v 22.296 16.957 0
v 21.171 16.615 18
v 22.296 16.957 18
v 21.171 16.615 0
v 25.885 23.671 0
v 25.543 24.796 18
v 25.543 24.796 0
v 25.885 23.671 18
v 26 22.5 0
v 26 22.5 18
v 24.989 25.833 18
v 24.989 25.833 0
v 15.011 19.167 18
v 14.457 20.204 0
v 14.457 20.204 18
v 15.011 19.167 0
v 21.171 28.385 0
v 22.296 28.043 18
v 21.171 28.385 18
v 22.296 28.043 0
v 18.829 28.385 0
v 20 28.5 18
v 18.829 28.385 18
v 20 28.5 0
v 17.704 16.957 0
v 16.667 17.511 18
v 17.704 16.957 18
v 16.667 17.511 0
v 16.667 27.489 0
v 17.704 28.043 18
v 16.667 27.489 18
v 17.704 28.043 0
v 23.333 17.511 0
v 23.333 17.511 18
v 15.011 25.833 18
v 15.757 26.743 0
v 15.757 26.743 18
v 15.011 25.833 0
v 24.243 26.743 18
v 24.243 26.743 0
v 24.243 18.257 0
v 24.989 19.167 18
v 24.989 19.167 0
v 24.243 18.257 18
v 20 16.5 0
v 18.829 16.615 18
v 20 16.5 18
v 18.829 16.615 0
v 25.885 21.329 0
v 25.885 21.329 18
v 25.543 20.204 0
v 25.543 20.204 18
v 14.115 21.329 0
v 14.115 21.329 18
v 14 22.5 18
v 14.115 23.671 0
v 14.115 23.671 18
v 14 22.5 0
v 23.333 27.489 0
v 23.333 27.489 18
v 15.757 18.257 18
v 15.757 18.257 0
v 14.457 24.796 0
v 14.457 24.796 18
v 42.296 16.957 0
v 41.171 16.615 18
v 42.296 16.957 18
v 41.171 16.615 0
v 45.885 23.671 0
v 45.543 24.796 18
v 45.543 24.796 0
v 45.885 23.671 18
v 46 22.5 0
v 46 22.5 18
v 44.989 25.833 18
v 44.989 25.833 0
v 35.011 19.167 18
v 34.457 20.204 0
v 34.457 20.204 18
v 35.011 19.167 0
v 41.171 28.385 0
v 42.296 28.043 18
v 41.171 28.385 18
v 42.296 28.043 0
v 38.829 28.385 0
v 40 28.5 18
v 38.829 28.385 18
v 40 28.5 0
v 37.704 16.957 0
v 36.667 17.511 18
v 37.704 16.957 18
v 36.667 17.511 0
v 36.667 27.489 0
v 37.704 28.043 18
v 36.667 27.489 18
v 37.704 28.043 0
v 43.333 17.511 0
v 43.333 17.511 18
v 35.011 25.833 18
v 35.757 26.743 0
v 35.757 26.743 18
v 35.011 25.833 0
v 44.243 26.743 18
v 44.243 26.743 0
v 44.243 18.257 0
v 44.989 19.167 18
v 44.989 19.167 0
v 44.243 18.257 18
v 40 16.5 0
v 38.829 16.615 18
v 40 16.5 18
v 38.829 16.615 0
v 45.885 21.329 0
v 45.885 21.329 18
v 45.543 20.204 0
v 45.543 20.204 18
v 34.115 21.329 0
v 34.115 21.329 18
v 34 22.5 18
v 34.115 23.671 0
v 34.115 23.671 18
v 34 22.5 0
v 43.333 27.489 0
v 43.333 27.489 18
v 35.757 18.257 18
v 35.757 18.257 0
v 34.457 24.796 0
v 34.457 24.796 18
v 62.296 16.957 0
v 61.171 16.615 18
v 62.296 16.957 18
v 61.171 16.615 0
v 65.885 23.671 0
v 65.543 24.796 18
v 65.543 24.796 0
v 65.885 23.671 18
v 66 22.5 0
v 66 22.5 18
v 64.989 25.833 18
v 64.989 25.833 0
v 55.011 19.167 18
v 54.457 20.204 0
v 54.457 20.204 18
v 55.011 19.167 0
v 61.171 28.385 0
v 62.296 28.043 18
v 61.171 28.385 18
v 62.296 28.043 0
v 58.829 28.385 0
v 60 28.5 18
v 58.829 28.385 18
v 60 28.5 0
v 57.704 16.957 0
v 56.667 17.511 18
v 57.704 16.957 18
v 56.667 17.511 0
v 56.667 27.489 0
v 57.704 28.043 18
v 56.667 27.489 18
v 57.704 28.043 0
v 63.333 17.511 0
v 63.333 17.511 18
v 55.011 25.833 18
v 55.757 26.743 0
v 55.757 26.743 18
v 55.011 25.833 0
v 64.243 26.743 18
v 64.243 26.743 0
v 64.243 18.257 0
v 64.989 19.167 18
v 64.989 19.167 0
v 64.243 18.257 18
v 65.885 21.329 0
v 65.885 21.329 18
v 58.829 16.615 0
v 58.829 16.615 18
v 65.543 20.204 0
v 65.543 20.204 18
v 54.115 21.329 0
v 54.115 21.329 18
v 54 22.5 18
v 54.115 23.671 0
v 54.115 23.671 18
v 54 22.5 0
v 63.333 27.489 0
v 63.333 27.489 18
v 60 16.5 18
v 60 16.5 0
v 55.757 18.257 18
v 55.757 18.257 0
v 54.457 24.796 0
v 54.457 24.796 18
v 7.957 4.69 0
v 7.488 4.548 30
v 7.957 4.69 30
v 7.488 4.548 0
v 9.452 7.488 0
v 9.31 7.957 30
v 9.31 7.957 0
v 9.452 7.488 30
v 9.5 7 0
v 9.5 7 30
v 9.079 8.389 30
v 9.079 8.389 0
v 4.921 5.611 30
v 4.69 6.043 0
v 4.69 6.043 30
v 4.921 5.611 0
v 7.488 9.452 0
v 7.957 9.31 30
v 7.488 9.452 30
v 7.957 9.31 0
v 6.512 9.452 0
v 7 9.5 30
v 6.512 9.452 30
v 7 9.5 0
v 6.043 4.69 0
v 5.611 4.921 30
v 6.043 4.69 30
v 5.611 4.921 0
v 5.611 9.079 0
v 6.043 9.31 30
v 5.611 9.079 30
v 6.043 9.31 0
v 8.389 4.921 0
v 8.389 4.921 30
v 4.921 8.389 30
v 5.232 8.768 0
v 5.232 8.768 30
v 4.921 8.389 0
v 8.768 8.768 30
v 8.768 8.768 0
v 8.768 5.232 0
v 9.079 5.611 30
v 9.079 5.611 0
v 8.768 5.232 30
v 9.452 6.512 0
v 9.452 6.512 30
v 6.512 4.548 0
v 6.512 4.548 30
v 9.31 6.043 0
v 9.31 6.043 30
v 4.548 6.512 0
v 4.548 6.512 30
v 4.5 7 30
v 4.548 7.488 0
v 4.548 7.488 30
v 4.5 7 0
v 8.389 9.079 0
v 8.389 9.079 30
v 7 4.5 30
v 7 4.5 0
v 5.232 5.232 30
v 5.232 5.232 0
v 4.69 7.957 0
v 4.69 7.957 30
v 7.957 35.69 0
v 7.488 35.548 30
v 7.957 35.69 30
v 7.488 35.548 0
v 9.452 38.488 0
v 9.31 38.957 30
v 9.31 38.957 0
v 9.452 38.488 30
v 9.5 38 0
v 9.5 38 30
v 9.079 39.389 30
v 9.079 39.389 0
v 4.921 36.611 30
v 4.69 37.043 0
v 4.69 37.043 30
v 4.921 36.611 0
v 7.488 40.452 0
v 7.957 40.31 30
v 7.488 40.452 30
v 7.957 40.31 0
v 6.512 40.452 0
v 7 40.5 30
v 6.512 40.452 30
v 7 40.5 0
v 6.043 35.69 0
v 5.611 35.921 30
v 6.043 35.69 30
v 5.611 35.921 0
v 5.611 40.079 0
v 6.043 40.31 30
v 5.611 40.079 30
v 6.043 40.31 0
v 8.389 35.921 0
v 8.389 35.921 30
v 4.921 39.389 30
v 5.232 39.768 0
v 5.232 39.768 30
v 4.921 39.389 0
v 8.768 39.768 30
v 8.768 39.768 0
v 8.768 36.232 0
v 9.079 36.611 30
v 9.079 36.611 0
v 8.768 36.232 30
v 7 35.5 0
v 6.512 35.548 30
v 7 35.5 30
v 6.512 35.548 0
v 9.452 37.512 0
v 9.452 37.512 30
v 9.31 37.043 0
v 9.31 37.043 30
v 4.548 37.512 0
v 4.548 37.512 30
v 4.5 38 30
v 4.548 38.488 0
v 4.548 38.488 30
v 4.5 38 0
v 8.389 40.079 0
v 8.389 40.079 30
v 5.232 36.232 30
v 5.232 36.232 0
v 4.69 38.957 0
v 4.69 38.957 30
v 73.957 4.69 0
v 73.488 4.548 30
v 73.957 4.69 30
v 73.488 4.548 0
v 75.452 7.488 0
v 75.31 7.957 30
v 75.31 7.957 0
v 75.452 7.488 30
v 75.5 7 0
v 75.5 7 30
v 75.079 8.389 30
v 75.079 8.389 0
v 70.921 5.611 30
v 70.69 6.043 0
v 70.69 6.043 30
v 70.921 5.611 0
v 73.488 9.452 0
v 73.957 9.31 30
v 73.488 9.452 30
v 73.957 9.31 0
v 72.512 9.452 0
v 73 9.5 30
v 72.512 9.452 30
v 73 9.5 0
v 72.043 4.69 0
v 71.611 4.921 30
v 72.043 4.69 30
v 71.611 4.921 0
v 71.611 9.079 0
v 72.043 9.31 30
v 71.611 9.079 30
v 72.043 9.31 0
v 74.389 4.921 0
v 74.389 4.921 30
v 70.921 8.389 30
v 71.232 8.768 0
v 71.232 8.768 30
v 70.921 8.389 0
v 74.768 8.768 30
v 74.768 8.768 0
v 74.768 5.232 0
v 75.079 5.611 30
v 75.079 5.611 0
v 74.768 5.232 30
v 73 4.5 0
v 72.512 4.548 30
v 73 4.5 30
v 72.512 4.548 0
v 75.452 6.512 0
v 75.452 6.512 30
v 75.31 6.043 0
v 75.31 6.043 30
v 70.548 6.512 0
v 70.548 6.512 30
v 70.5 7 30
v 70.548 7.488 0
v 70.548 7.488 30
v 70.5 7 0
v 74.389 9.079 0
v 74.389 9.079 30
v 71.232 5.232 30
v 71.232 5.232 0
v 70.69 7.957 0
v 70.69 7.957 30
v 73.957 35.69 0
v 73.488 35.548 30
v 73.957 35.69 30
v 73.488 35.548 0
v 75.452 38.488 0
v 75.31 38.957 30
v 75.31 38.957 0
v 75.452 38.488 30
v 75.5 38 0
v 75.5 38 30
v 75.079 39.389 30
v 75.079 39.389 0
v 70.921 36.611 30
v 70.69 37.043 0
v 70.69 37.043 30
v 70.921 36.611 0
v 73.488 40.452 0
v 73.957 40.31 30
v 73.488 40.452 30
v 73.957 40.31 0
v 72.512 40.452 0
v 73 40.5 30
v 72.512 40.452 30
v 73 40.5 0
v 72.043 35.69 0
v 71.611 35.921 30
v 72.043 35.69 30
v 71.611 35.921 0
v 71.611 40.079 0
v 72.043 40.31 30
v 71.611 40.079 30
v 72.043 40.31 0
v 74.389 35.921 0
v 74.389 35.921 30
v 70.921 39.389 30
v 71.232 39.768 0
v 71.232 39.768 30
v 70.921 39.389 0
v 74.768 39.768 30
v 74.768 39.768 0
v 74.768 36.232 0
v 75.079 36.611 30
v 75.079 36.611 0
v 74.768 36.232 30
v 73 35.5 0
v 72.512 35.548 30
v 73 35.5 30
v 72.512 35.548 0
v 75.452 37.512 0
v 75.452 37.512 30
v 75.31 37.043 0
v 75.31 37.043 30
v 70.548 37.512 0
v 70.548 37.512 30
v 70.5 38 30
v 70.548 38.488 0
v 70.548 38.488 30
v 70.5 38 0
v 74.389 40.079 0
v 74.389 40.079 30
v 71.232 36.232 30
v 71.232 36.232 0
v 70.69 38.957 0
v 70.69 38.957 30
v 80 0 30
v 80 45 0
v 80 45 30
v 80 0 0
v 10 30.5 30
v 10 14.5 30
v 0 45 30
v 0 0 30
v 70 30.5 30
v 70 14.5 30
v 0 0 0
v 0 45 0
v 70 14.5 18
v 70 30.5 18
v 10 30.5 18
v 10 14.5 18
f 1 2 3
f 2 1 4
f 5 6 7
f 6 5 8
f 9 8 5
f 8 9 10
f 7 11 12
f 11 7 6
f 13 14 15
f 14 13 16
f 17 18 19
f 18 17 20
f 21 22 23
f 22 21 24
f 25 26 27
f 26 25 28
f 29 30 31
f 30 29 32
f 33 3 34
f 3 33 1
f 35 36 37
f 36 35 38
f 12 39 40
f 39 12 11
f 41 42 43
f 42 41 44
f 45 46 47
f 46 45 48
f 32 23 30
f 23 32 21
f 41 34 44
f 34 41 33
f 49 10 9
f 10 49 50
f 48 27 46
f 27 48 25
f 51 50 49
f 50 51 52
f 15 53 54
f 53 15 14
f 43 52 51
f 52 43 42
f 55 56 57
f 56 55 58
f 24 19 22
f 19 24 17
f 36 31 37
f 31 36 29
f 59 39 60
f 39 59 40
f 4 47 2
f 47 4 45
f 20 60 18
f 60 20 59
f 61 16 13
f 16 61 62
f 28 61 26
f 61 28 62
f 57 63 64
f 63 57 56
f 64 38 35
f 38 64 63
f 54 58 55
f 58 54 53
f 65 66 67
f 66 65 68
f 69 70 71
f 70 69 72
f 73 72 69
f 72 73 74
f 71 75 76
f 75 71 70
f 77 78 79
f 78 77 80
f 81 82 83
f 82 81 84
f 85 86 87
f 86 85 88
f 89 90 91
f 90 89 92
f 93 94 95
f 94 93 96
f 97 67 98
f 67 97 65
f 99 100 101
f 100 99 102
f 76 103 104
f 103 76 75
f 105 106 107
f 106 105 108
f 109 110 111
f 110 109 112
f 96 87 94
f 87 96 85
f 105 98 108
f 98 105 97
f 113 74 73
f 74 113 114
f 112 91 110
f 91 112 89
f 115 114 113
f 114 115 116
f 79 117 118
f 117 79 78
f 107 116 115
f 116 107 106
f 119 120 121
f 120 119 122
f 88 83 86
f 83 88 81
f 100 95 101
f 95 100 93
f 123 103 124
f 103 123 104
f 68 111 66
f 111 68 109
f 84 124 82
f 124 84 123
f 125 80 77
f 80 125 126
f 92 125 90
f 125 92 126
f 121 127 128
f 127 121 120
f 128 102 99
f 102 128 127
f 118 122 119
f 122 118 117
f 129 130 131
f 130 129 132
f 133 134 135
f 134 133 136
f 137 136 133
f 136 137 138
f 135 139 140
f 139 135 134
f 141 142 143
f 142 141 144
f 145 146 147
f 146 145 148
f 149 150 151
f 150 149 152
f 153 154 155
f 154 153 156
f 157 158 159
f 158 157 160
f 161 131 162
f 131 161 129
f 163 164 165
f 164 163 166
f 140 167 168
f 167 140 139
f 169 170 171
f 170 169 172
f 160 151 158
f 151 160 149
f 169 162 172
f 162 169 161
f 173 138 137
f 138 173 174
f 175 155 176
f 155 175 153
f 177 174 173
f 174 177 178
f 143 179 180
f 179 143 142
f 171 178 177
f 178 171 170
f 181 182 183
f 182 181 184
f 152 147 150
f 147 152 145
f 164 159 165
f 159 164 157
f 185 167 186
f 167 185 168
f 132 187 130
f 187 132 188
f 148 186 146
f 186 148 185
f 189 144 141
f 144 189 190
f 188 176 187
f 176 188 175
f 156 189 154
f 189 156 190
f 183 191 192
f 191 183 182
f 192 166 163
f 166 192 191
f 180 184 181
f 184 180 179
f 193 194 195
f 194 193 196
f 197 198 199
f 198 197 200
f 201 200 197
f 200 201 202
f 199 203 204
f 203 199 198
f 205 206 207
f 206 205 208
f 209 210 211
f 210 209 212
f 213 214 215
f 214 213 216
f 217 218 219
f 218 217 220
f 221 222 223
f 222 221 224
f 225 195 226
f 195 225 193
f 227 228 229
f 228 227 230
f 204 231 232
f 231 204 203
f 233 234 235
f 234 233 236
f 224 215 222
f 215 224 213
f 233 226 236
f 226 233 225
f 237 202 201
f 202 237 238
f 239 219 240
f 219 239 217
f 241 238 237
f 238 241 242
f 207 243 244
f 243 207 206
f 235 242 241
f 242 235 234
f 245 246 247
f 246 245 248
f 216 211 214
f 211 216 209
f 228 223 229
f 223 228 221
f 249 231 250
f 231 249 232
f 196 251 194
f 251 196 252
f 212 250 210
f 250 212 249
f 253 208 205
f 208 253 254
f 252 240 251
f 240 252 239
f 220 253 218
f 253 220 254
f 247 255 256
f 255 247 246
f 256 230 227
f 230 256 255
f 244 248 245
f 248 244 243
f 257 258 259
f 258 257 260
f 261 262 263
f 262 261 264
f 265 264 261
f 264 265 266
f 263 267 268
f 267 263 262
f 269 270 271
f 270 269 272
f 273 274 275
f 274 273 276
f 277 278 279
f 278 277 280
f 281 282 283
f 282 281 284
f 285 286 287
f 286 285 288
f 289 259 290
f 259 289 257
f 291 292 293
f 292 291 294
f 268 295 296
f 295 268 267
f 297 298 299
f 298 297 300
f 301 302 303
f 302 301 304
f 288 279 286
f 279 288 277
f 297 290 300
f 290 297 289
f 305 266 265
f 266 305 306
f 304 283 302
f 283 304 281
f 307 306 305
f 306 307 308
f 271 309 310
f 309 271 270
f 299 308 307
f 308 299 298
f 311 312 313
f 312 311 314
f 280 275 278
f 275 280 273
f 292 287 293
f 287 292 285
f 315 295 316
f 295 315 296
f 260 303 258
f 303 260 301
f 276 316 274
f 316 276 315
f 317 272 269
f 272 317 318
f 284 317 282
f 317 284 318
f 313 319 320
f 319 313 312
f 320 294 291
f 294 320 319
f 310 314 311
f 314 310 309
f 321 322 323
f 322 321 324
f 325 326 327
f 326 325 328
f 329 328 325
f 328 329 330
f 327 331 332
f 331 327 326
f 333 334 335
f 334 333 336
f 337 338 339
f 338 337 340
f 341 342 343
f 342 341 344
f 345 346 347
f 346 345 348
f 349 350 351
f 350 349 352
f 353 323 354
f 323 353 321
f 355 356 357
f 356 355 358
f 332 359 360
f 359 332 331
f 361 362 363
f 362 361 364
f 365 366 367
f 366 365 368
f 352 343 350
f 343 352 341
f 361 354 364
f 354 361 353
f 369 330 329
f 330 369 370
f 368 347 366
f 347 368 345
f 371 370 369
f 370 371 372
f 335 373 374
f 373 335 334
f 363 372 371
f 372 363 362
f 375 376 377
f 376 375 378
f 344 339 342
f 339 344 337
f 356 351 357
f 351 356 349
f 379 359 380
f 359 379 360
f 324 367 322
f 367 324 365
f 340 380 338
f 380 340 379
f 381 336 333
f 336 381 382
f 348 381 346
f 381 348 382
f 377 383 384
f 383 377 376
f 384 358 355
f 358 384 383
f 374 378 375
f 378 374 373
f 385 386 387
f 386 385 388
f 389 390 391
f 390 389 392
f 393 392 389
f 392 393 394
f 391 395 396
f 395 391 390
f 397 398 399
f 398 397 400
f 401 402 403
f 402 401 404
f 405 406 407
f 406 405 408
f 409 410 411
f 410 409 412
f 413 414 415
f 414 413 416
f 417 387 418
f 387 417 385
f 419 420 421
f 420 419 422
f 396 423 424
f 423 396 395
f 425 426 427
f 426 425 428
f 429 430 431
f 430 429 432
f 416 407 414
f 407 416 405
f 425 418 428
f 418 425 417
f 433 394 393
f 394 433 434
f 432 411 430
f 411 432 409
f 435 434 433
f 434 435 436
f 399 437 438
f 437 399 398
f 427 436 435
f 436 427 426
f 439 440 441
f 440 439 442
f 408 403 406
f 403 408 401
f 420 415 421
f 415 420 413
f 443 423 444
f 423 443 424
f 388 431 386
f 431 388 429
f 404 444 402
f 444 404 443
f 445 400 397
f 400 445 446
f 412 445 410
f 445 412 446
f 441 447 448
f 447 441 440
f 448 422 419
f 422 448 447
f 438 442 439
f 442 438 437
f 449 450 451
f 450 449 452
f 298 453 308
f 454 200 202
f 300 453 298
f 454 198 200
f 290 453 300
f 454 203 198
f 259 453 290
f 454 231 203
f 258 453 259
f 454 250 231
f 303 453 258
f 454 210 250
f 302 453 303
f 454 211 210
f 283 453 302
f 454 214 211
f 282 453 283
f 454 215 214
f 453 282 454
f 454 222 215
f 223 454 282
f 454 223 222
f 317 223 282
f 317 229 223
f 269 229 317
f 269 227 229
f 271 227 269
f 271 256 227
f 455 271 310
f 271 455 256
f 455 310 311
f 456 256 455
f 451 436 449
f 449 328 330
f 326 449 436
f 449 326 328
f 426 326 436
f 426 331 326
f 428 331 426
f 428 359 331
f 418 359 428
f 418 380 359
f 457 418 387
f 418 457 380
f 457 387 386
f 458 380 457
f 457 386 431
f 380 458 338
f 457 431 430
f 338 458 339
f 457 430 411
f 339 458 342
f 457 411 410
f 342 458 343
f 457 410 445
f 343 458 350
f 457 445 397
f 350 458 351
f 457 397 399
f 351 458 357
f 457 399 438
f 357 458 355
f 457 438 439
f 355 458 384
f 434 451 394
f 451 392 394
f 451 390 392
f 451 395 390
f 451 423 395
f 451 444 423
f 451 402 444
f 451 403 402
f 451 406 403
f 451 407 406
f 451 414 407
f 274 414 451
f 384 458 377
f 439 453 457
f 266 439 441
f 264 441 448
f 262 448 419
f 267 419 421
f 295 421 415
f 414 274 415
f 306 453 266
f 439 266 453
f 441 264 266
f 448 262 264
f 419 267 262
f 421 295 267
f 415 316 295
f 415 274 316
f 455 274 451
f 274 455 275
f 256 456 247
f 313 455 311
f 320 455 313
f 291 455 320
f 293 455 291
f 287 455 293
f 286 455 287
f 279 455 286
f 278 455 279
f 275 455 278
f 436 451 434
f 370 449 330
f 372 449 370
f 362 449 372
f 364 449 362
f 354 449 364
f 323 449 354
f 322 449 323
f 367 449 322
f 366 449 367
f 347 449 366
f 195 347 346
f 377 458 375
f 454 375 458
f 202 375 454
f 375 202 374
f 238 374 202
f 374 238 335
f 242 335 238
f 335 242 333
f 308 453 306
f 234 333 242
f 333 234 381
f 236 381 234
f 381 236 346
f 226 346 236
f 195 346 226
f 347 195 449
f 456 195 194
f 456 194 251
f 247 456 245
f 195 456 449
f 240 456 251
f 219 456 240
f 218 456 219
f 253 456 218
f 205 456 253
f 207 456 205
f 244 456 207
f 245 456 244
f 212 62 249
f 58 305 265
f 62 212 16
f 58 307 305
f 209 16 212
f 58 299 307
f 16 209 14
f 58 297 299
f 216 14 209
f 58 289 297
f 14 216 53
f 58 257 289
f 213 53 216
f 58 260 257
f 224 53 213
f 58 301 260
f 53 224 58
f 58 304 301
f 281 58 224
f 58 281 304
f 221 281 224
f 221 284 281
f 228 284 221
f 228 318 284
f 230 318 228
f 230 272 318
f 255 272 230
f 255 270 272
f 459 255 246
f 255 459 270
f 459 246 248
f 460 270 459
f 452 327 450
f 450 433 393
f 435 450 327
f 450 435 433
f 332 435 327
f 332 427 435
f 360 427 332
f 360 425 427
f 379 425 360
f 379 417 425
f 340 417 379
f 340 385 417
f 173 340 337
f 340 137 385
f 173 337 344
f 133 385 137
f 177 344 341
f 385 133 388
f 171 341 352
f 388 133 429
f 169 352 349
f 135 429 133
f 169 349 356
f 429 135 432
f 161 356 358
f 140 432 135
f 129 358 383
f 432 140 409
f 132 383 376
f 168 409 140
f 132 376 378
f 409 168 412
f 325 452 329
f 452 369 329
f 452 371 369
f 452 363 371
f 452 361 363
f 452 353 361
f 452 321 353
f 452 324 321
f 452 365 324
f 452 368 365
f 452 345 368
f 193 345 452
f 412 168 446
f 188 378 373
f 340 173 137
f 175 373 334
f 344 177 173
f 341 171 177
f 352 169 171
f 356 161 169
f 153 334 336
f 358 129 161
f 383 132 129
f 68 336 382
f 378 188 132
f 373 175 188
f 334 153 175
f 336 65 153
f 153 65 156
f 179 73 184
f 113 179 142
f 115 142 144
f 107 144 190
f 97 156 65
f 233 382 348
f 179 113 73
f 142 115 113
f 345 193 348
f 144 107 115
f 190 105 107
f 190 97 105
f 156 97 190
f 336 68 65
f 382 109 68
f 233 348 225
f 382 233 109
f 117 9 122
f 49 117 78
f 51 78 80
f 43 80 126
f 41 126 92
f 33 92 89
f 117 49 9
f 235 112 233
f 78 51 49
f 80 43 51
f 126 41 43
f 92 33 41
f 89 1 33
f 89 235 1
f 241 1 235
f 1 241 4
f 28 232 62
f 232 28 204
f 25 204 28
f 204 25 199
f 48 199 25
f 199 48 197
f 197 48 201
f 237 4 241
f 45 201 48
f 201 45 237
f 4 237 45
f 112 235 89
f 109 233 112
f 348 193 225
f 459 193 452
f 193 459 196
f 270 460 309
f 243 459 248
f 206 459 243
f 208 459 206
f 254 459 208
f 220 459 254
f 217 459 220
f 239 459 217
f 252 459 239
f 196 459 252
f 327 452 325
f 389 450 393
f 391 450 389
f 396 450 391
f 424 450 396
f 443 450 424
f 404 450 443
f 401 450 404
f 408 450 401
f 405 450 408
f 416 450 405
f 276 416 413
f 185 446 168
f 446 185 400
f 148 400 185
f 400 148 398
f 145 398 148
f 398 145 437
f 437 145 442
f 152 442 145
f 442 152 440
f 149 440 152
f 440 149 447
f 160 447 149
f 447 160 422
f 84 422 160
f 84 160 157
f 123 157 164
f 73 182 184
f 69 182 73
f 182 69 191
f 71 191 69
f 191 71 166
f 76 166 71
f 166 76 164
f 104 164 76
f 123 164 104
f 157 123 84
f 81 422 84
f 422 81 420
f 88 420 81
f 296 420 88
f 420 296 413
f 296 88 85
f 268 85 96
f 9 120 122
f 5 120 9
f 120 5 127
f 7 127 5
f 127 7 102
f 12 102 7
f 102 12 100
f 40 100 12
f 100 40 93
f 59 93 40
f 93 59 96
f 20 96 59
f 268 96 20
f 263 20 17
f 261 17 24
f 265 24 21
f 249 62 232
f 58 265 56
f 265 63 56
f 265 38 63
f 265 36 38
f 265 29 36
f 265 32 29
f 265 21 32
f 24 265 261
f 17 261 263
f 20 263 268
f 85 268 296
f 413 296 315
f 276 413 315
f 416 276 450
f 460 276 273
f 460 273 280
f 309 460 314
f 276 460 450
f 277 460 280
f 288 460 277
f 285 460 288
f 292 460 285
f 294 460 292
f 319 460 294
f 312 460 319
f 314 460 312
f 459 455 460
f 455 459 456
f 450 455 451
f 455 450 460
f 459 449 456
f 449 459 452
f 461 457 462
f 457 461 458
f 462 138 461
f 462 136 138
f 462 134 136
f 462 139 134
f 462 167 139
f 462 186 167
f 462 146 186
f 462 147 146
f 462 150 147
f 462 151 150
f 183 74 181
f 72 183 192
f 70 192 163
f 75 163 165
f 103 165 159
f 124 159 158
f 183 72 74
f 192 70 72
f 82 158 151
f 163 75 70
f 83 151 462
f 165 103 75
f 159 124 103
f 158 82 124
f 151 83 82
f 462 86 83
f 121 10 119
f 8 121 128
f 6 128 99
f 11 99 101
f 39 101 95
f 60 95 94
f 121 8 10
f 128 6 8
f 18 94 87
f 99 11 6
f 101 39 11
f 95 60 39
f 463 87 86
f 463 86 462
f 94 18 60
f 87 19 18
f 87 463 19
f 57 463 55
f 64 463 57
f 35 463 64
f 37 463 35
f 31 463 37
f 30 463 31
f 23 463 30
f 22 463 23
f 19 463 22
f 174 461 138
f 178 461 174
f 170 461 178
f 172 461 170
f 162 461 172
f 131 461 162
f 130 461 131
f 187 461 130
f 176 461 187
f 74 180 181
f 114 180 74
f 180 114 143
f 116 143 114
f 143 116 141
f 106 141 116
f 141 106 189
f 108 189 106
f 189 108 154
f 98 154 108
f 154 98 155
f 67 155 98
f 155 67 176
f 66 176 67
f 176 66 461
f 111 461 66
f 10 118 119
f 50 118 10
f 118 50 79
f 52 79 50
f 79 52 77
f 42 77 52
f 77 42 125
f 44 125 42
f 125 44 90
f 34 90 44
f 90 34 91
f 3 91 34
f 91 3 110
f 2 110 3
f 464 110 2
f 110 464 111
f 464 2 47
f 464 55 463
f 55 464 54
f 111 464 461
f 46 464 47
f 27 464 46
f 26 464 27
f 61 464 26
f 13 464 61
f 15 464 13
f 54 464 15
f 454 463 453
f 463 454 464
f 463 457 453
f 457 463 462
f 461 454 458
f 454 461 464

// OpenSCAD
$fn = 32;

// ----------------------------------------------------------------------
// Manifold block: gallery_top manifold
// ----------------------------------------------------------------------

// --- parameters (mm) ---
block_l = 80;             // block length, X
block_w = 45;             // block width, Y
block_h = 30;             // block height, Z
port_d = 12;              // port bore diameter
port_pitch = 20;          // port pitch along X
gallery_d = 16;           // top gallery width, Y
gallery_depth = 12;       // gallery pocket depth
wall_p = 10;              // gallery end wall thickness, X
mnt_d = 5;                // mounting hole diameter
mnt_in = 7;               // mounting hole inset from the edges

n_ports = 3;  // ports in the row
port_x0 = (block_l - (n_ports - 1) * port_pitch) / 2;  // first port X

difference() {
  cube([block_l, block_w, block_h]);
  for (i = [0 : n_ports - 1])
    translate([port_x0 + i * port_pitch, block_w / 2, -1])
      cylinder(h = block_h + 2, d = port_d);
  translate([wall_p, block_w / 2 - gallery_d / 2, block_h - gallery_depth])
    cube([block_l - 2 * wall_p, gallery_d, gallery_depth + 1]);
  for (cx = [mnt_in, block_l - mnt_in])
    for (cy = [mnt_in, block_w - mnt_in])
      translate([cx, cy, -1]) cylinder(h = block_h + 2, d = mnt_d);
}
